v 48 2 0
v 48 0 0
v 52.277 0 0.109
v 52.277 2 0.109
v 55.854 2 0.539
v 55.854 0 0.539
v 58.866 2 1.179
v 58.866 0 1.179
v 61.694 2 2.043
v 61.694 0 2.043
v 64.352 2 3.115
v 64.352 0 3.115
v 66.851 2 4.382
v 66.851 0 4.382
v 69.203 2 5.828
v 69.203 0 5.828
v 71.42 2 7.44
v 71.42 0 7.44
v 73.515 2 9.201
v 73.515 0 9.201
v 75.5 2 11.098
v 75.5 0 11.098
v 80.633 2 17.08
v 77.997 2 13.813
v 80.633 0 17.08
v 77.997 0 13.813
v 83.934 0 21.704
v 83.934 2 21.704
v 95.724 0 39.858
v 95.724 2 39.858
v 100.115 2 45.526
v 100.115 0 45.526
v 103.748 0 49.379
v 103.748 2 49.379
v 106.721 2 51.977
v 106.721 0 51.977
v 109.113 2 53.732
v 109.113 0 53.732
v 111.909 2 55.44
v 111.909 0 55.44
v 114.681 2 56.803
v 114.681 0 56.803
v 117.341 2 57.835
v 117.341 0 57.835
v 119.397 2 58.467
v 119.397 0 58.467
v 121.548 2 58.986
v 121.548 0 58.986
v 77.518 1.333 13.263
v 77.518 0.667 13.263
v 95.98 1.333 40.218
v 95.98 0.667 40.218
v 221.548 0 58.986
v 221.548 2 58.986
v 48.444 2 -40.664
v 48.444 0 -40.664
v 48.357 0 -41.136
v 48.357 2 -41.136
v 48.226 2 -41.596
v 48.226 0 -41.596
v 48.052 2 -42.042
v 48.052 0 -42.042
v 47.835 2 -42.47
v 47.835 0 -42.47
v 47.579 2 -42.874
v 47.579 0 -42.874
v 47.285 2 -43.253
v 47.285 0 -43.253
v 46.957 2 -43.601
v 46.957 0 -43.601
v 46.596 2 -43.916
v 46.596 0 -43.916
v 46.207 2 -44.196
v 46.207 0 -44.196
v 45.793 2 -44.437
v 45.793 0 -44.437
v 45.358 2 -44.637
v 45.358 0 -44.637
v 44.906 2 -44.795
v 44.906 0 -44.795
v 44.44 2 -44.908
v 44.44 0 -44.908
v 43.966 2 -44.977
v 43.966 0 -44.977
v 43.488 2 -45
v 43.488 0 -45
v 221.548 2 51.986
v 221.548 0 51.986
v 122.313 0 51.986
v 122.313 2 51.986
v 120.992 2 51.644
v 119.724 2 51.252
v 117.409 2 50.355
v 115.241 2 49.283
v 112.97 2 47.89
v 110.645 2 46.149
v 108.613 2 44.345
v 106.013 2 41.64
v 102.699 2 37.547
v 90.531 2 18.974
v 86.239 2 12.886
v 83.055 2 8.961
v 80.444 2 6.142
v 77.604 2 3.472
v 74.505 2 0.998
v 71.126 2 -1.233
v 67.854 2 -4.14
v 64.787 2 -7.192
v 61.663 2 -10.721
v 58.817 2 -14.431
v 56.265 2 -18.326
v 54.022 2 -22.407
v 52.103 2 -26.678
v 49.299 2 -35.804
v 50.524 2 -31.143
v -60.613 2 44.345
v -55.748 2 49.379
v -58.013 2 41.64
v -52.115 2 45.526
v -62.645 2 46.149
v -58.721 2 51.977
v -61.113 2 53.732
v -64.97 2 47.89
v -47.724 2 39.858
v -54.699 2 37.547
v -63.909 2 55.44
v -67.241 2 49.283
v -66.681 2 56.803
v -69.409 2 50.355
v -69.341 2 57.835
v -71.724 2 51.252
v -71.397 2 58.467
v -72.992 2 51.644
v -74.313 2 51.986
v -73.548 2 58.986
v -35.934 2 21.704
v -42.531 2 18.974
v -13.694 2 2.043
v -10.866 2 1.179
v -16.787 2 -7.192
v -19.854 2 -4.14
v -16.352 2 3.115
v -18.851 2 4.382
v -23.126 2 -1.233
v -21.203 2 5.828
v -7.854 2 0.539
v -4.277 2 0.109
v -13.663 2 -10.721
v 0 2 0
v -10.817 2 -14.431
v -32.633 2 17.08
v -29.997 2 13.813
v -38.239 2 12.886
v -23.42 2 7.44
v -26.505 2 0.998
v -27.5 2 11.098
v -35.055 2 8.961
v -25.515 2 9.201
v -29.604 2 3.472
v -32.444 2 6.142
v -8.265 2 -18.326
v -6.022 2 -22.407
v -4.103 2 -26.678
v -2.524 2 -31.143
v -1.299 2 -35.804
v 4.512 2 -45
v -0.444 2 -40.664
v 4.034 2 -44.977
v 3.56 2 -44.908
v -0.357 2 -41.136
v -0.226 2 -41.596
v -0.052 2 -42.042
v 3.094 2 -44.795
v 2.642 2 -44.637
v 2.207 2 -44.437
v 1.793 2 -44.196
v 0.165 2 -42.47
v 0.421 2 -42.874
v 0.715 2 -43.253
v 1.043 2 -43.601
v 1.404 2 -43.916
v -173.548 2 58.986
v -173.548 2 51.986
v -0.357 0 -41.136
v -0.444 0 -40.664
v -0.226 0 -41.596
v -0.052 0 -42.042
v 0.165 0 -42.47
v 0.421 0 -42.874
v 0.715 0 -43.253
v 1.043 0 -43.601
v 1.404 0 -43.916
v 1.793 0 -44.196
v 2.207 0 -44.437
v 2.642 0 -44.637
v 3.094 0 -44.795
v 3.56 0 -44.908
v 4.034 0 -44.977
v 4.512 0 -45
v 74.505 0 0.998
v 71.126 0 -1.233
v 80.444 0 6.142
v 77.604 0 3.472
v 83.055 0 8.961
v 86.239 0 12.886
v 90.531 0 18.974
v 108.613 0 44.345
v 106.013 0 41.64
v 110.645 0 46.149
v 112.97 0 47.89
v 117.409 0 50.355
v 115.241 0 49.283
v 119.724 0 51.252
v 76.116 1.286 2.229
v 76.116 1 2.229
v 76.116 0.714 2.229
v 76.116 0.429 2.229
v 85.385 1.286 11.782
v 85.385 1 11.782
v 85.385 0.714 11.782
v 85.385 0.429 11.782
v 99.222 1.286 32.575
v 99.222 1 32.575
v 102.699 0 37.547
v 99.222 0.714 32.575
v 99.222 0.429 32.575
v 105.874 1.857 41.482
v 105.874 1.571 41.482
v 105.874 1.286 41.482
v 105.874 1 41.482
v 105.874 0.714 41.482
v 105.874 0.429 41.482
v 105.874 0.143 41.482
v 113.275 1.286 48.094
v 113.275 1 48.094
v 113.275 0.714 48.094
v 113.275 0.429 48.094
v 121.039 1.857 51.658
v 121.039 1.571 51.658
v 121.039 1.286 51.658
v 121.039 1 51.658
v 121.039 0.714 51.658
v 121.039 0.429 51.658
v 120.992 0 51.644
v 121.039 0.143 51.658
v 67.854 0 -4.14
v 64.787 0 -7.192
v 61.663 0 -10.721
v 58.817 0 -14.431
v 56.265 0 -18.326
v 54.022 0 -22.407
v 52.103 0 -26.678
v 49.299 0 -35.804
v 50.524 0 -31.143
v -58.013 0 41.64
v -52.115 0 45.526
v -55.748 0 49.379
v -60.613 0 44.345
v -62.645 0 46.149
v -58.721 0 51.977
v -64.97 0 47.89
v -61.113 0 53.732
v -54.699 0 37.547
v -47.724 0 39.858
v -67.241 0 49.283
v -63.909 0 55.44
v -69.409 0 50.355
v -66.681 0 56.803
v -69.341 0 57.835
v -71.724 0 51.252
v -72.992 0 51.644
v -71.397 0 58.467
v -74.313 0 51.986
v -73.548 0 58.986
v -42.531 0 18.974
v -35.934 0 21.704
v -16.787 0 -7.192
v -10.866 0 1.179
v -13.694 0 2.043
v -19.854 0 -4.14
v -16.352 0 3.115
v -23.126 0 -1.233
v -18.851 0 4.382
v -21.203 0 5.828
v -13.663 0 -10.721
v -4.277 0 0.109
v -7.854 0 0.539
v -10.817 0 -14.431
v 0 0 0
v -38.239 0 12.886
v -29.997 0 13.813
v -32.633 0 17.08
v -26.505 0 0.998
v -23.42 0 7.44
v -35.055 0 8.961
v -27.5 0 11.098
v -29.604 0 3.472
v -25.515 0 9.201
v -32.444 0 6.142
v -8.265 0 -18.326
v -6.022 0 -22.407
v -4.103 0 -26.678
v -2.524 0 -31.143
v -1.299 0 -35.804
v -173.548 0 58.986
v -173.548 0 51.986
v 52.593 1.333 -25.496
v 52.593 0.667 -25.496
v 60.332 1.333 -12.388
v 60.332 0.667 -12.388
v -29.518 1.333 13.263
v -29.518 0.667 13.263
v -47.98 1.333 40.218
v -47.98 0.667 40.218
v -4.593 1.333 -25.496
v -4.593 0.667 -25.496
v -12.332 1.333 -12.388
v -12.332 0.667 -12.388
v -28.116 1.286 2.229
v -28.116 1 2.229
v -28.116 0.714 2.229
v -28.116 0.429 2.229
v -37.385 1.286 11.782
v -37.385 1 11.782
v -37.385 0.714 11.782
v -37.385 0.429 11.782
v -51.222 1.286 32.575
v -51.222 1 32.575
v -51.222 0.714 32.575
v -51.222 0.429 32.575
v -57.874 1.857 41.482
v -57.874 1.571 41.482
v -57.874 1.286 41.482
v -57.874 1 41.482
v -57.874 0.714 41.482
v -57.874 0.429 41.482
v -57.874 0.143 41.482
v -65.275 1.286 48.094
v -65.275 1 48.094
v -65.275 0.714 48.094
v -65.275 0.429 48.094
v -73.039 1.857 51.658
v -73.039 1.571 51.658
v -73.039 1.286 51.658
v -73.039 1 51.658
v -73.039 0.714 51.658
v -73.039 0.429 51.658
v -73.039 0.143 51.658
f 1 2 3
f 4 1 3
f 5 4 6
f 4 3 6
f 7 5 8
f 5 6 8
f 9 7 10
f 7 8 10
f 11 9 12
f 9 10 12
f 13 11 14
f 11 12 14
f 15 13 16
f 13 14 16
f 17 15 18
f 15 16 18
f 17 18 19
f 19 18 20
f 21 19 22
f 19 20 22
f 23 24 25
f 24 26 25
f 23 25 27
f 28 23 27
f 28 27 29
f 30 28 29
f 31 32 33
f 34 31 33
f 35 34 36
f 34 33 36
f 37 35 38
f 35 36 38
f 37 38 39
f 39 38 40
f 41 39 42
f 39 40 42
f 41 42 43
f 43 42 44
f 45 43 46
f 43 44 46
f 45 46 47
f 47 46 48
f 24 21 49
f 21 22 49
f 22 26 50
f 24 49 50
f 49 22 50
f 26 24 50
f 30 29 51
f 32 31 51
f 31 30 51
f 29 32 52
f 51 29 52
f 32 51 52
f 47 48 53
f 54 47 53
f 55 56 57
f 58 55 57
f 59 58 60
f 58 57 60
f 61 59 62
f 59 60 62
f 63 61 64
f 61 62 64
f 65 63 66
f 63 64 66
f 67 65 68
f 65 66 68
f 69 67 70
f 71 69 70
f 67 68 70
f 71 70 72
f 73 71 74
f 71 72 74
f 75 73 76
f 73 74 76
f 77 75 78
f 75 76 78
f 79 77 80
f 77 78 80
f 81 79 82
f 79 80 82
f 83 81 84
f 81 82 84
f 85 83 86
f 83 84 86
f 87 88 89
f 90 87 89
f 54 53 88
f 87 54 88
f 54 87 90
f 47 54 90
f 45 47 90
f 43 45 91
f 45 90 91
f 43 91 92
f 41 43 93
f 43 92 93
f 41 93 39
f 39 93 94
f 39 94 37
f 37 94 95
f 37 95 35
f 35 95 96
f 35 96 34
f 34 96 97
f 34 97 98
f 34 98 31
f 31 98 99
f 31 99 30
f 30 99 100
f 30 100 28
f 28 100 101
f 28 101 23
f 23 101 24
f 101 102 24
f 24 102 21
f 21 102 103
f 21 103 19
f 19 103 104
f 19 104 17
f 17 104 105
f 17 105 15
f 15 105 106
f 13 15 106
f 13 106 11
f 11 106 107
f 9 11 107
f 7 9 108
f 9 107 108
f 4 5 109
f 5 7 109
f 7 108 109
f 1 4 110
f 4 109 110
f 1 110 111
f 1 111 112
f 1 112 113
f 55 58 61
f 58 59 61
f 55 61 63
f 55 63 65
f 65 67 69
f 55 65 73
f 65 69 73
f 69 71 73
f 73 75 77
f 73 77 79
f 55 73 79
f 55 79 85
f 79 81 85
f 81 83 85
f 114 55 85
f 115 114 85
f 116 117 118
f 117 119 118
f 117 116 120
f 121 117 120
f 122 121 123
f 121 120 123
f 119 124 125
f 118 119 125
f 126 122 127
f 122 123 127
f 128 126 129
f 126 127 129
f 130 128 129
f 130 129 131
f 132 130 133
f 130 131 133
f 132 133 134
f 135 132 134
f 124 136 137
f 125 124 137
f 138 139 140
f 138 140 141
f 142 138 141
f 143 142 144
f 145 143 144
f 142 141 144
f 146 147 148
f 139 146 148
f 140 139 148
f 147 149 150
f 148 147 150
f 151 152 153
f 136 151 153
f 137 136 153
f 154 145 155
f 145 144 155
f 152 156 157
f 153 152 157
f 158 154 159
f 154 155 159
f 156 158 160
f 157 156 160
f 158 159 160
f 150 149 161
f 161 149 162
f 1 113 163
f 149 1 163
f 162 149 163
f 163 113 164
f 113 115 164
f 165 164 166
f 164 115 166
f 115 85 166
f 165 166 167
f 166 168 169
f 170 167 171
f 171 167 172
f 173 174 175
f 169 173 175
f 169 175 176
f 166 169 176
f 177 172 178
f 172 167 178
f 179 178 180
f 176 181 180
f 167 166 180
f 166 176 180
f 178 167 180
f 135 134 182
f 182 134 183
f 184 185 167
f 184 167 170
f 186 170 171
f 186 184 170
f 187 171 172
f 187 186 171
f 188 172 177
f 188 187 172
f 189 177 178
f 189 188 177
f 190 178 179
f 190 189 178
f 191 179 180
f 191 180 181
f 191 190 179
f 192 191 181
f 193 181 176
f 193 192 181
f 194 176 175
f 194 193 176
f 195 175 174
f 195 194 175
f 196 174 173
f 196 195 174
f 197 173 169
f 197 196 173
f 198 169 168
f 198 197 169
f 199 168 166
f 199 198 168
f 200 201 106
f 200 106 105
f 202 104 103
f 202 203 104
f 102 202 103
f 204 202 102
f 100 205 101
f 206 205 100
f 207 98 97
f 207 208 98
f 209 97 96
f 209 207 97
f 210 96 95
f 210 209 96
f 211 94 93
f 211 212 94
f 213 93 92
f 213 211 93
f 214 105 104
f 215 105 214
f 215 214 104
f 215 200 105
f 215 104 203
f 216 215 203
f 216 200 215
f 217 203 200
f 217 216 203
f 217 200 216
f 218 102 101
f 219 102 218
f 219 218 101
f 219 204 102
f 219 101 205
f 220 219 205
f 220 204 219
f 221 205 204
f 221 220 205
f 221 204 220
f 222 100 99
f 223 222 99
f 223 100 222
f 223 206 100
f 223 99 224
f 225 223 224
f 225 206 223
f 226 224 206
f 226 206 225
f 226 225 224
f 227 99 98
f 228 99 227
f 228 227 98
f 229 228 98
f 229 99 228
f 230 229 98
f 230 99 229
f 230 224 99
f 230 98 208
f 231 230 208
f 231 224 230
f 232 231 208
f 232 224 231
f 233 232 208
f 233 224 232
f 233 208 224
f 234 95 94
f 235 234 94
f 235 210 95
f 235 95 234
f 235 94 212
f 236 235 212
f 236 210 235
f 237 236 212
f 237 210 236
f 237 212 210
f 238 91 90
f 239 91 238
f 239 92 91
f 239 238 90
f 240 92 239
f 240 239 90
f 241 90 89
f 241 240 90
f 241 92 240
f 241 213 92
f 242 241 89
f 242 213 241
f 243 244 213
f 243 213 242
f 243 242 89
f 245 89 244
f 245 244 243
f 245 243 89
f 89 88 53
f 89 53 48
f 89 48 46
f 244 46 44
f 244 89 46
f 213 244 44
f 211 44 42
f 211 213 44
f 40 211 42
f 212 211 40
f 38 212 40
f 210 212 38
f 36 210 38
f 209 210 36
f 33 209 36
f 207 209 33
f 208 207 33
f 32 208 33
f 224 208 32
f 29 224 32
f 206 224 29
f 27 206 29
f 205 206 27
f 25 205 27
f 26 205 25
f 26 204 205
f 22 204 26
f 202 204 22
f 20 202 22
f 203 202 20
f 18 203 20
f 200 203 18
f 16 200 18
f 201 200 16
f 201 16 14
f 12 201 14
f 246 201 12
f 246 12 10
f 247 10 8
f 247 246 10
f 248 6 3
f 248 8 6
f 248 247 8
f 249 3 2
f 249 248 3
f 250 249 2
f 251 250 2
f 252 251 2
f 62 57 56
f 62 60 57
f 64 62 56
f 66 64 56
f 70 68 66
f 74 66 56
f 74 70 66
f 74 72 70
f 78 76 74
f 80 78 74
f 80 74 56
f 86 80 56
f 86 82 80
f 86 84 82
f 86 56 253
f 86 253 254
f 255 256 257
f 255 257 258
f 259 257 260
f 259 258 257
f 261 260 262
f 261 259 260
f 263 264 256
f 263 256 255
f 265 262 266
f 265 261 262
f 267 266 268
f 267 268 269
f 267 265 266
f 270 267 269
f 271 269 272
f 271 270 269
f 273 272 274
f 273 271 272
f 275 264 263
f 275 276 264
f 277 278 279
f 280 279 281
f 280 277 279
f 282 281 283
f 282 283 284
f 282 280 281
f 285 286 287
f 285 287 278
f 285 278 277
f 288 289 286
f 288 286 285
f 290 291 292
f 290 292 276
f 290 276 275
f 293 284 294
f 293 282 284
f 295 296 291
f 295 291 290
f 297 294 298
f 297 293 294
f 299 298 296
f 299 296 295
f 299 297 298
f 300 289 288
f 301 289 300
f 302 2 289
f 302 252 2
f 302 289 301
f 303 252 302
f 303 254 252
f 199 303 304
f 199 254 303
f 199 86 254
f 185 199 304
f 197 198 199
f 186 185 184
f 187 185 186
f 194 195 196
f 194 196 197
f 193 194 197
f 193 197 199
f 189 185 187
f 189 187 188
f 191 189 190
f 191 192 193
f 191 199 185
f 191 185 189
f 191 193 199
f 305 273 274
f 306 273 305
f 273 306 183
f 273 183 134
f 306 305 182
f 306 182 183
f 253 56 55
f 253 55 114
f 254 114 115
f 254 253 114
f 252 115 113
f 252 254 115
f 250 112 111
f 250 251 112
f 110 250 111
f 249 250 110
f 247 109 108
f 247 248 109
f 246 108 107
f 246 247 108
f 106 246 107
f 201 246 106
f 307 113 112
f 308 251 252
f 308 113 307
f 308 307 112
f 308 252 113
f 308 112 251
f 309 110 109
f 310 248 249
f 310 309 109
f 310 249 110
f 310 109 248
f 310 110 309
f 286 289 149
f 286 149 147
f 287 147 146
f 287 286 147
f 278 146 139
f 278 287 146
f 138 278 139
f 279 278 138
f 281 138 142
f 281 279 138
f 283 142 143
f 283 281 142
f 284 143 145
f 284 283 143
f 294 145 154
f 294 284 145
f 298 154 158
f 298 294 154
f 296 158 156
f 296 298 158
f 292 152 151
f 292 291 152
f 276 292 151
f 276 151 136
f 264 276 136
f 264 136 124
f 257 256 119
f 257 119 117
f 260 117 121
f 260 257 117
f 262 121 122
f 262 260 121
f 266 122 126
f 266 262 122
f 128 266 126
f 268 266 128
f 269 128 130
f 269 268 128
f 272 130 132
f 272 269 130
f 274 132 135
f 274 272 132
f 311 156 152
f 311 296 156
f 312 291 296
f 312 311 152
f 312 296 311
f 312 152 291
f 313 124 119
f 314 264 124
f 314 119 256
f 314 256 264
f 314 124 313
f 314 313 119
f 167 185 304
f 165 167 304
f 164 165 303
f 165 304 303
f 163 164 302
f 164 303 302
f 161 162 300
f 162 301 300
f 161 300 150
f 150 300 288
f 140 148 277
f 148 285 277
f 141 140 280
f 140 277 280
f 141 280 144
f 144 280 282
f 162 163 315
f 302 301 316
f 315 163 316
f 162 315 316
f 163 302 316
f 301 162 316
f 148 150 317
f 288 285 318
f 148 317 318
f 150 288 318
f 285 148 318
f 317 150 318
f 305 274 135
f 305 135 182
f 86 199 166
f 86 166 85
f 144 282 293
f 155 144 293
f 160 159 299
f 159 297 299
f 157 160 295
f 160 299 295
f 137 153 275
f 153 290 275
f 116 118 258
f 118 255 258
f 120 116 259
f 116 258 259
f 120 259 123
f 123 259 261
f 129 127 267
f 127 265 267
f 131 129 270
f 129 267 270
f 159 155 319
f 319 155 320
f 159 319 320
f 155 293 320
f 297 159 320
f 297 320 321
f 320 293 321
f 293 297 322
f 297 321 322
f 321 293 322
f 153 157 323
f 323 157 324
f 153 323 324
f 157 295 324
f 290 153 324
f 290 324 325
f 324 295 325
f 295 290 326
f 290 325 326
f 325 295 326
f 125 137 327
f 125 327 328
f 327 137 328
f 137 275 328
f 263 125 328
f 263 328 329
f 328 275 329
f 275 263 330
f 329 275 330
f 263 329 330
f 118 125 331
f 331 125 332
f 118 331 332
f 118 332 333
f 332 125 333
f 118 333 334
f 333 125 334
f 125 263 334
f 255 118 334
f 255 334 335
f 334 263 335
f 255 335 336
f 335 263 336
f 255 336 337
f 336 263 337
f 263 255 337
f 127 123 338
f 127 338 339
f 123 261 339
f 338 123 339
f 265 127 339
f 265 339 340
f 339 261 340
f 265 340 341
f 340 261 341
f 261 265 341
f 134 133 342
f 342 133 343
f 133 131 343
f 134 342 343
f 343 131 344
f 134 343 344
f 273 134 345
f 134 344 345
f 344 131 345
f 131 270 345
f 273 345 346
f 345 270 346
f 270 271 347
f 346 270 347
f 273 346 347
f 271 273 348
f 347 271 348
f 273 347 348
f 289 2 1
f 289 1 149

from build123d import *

# Parameters (mm, degrees)
BOSS_EXTRUDE1_DEPTH = 2


with BuildPart() as part:
    # Sketch1 → Boss-Extrude1 (new body)
    with BuildSketch(Plane(origin=(0, 0, 0), x_dir=(1, 0, 0), z_dir=(0, 1, 0))):
        with BuildLine():
            Line((24, 0), (48, 0))
            add(Edge.make_bspline(
                [(48, 0), (89.099365724, 0.874773385), (86.374059044, -51.603142983), (121.547837425, -58.986384407)],
                knots=[0, 0, 0, 0, 1, 1, 1, 1], degree=3))
            Line((121.547837425, -58.986384407), (221.547837425, -58.986384407))
            Line((221.547837425, -58.986384407), (221.547837425, -51.986384407))
            Line((221.547837425, -51.986384407), (122.313023704, -51.986384407))
            add(Edge.make_bspline(
                [(71.125998731, 1.232568174), (72.898809563, 0.181682333), (76.459813959, -2.315666191), (81.189700312, -6.726275017), (86.891376041, -13.416403627), (92.807836153, -22.347568969), (98.129903366, -31.060917059), (102.469737091, -37.345221684), (105.842818581, -41.580534372), (109.401004038, -45.224982649), (112.577237242, -47.710854013), (115.306225207, -49.358382328), (117.470523961, -50.422439309), (119.399803514, -51.164246751), (121.027397151, -51.664895321), (121.885844483, -51.886407758), (122.313023704, -51.986384407)],
                knots=[0.193856357, 0.193856357, 0.193856357, 0.193856357, 0.248016758, 0.310020948, 0.372025138, 0.496033517, 0.620041896, 0.682046086, 0.744050275, 0.806054465, 0.868058655, 0.899060749, 0.930062844, 0.961064939, 0.976565986, 0.992067034, 0.992067034, 0.992067034, 0.992067034], degree=3))
            add(Edge.make_bspline(
                [(48.443659708, 40.664433584), (50.620366821, 24.429534749), (58.981751845, 11.448277847), (71.125998731, 1.232568174)],
                knots=[0.080375853, 0.080375853, 0.080375853, 0.080375853, 1, 1, 1, 1], degree=3))
            ThreePointArc((48.443659708, 40.664433584), (46.780254452, 43.763121571), (43.488003544, 45))
            Line((43.488003544, 45), (24, 45))
            Line((24, 45), (24, 0))
        make_face()
    boss_extrude1 = extrude(amount=BOSS_EXTRUDE1_DEPTH)

    # Mirror1: Boss-Extrude1 across plane
    add(boss_extrude1.mirror(Plane(origin=(24, 2, -45), x_dir=(0, 0, 1), z_dir=(1, 0, 0))))


solid = part.part
